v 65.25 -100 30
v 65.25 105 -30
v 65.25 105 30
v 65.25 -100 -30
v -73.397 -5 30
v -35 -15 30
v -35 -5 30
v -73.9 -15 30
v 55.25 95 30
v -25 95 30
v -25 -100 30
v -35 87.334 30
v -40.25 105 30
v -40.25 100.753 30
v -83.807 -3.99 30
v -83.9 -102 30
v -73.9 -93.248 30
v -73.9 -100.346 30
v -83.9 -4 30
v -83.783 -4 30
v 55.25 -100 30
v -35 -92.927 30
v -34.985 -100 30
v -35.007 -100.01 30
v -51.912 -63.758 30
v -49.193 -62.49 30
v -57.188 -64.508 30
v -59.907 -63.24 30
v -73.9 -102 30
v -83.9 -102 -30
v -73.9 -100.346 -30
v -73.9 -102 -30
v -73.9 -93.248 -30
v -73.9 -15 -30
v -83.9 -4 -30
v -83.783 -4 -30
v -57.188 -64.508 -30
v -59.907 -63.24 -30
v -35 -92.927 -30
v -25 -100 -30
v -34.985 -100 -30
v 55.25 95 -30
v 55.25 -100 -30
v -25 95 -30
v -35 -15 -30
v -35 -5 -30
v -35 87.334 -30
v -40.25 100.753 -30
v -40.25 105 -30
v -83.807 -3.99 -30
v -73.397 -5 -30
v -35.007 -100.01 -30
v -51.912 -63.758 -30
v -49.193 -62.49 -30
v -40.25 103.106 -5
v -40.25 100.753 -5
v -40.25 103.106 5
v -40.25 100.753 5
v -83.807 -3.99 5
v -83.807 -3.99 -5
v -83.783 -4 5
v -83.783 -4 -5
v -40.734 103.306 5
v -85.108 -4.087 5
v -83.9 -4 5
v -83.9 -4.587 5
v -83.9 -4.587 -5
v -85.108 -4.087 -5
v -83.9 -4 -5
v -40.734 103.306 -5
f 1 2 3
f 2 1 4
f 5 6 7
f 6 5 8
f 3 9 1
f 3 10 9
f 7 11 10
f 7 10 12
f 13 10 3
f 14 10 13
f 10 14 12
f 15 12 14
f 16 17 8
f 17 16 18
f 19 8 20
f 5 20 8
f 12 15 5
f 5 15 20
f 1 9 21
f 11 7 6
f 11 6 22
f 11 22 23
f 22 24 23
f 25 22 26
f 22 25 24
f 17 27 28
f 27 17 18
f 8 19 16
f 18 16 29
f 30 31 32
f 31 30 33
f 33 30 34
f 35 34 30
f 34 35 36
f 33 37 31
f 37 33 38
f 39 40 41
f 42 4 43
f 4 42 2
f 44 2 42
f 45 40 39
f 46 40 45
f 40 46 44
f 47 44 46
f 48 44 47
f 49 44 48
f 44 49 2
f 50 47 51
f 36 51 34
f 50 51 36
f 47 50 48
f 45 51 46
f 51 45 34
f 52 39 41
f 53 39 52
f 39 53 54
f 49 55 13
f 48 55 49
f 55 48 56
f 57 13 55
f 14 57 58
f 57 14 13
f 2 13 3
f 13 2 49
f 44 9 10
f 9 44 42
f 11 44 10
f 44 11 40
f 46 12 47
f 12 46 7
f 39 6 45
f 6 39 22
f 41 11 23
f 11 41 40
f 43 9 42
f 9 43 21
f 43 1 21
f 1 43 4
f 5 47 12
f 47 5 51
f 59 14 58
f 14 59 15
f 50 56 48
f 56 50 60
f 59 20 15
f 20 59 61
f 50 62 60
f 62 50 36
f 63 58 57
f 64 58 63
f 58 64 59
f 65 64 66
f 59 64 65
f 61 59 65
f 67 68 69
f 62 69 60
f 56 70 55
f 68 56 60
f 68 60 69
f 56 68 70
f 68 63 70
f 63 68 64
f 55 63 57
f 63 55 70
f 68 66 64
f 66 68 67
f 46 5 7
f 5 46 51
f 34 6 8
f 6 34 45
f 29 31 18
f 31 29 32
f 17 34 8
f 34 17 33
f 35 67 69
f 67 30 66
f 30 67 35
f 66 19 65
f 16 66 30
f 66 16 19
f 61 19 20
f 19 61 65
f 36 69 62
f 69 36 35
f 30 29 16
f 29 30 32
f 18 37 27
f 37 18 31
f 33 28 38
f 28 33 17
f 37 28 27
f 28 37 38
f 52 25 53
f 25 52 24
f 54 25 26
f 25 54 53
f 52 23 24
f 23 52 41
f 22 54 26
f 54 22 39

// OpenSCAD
// Whiteboard bracket for cubicle

// top support of bracket
translate ([12.5,100,0])
  cube([105.5,10,60],true);

// Two pillars on top of cube wall
// Left
translate ([-30,0,0])
  cube([10,200,60],true);
// Right
translate ([60.25,0,0])
  cube([10,200,60],true);

// Slanted column to support whiteboard
// Left
translate ( [-57.4,46.49,0] )
rotate([0,0,-22.58])
  cube([10,113.5,60],true);

// Slanted support stripe
translate ( [-58.3,47.7,0] )
rotate([0,0,-22.45])
  cube([10,116.2,10],true);

// bottom horizontal support of bracket
translate ([-55.8,-10,0])
  cube([45,10,60],true);

//base vertical support
translate ([-78.9,-53,0])
  cube([10,98,60],true);

// whiteboard frame clips
// Left
translate ( [-67,-82.0,0] )
rotate([0,0,-25])
  cube([3,40,60],true);
// Right
translate ( [-42.1,-81.25,0] )
rotate([0,0,25])
  cube([3,40,60],true);
